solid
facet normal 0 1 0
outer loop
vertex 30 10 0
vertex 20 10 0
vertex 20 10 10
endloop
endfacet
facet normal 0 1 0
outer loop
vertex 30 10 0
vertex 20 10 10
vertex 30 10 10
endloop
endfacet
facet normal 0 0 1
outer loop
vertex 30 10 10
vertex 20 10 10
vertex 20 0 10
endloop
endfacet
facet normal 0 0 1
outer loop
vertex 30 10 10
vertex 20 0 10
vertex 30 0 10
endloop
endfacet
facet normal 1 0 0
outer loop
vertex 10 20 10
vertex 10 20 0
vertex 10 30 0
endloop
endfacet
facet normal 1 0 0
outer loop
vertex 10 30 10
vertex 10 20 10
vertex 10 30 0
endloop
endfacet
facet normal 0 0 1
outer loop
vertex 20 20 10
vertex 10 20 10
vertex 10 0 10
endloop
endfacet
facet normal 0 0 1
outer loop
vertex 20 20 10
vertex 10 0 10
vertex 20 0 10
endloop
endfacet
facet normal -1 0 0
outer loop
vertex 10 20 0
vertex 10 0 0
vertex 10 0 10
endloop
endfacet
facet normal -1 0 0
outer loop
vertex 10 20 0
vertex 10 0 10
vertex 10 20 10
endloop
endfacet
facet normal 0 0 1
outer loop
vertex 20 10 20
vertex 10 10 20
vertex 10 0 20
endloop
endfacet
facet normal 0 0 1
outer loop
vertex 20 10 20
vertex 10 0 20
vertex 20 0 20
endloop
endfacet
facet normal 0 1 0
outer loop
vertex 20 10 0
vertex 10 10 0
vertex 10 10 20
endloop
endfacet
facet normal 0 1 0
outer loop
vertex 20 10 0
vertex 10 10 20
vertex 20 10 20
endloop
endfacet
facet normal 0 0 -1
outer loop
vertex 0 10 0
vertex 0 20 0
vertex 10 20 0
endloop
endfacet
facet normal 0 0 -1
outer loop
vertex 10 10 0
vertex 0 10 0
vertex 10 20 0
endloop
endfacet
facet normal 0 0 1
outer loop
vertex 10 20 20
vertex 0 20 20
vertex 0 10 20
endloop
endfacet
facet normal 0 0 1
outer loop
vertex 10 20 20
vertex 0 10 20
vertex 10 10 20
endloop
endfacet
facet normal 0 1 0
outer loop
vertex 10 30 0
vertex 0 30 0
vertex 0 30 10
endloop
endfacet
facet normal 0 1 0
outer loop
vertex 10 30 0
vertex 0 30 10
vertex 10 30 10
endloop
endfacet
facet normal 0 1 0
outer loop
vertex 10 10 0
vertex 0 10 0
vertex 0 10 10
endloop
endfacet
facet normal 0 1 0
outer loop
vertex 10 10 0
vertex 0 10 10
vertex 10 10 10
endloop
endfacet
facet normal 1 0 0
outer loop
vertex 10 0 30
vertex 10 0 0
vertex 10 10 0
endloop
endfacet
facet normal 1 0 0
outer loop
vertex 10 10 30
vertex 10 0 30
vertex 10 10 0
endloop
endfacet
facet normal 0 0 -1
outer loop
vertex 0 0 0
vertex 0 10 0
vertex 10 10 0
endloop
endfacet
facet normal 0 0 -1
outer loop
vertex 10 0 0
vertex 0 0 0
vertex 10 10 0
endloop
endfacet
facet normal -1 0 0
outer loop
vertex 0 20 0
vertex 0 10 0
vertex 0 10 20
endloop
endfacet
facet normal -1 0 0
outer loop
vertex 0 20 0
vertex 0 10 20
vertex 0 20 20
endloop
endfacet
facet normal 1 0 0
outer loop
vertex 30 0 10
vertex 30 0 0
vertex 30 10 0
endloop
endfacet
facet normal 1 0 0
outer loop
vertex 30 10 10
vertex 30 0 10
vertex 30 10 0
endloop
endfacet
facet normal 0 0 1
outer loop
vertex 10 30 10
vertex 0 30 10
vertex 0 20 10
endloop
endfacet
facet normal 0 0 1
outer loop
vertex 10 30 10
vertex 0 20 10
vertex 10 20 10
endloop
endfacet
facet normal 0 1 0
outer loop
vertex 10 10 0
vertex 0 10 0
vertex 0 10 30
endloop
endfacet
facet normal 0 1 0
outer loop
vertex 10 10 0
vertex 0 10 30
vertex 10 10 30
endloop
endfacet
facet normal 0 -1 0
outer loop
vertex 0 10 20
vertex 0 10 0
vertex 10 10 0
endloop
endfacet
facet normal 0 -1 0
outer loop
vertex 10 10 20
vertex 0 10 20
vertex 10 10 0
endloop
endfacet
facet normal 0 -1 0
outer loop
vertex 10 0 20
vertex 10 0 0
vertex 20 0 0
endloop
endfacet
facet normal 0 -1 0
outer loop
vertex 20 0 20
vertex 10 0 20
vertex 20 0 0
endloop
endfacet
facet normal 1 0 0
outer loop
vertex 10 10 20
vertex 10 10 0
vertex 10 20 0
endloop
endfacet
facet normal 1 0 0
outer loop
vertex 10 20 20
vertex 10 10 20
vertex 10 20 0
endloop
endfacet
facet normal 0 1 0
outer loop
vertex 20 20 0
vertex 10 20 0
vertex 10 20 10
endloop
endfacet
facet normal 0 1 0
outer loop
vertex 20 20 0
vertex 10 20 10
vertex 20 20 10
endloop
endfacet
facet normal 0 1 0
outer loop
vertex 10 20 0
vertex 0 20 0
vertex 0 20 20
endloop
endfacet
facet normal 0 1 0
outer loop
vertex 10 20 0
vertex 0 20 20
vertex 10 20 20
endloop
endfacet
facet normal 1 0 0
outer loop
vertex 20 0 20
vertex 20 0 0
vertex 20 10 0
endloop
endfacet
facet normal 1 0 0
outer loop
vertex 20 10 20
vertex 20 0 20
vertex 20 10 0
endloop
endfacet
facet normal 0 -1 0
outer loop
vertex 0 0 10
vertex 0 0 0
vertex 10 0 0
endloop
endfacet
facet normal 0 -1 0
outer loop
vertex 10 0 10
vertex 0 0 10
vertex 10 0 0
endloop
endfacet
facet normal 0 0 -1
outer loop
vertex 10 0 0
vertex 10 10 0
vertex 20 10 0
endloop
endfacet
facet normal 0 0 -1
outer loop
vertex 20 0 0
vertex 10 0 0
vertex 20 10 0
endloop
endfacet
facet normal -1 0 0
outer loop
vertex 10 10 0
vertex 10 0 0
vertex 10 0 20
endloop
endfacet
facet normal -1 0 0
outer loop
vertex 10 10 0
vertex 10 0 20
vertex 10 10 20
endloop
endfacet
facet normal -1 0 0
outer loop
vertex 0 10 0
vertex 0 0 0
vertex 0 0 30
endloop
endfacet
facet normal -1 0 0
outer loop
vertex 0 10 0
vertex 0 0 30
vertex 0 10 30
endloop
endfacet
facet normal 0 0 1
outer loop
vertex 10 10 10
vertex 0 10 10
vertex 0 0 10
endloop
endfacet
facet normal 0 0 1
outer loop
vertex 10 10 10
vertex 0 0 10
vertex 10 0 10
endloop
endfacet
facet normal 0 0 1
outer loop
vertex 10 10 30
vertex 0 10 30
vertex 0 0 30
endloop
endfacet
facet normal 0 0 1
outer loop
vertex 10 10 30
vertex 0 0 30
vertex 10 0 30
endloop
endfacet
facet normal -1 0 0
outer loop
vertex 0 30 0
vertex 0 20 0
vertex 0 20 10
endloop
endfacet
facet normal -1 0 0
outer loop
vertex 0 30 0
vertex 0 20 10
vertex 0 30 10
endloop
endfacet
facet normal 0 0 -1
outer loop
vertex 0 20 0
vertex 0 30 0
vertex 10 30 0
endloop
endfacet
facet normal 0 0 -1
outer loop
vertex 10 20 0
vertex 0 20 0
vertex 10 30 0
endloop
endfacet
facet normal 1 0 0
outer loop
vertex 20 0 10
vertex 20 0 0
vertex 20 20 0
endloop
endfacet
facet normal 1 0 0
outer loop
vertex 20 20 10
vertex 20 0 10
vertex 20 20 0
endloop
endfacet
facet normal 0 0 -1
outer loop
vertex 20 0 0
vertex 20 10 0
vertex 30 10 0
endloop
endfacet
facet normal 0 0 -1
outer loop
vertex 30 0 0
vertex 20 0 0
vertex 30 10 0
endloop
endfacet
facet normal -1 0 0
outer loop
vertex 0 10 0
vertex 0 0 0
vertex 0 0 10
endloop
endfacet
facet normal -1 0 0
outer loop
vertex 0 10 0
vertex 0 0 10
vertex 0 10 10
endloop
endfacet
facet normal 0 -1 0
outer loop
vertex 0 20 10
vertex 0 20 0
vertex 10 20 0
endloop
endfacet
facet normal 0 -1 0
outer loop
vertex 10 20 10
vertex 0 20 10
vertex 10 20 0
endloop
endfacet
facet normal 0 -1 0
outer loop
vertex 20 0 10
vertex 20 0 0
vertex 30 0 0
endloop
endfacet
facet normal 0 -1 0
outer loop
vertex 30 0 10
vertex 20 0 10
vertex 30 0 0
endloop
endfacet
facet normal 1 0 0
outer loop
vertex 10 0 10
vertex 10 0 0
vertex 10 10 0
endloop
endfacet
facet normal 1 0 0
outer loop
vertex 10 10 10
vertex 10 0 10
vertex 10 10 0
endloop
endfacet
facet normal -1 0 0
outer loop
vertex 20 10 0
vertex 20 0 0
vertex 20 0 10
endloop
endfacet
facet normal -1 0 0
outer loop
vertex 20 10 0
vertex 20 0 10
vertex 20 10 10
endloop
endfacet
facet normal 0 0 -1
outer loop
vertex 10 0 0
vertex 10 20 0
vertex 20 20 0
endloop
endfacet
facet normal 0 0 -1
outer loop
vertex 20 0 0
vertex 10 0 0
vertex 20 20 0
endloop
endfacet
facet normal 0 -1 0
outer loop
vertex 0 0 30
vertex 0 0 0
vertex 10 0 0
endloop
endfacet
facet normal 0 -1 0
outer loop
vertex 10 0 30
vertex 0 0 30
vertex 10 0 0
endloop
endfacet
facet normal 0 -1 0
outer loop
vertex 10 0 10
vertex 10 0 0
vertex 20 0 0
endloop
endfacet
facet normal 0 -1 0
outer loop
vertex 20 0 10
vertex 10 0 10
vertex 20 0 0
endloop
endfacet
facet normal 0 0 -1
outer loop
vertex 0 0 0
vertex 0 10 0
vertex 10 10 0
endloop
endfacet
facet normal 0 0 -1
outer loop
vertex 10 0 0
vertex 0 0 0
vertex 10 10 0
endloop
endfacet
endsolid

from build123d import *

# Parameters (mm, degrees)
BOX_W        = 10
BOX_H        = 10
BOX_DEPTH    = 30
BOX001_W     = 10
BOX001_H     = 10
BOX001_DEPTH = 20
BOX002_W     = 10
BOX002_H     = 20
BOX002_DEPTH = 10
BOX003_W     = 10
BOX003_H     = 10
BOX003_DEPTH = 10
BOX004_W     = 10
BOX004_H     = 10
BOX004_DEPTH = 10
BOX005_W     = 10
BOX005_H     = 10
BOX005_DEPTH = 10
BOX006_W     = 10
BOX006_H     = 10
BOX006_DEPTH = 20


with BuildPart() as cub:
    # Box → Box (new body)
    with BuildSketch(Plane.XY):
        with Locations((5, 5)):
            Rectangle(BOX_W, BOX_H)
    extrude(amount=BOX_DEPTH)


with BuildPart() as cub001:
    # Box001 → Box001 (new body)
    with BuildSketch(Plane(origin=(0, 10, 0), x_dir=(1, 0, 0), z_dir=(0, 0, 1))):
        with Locations((5, 5)):
            Rectangle(BOX001_W, BOX001_H)
    extrude(amount=BOX001_DEPTH)


with BuildPart() as cub002:
    # Box002 → Box002 (new body)
    with BuildSketch(Plane(origin=(10, 0, 0), x_dir=(1, 0, 0), z_dir=(0, 0, 1))):
        with Locations((5, 10)):
            Rectangle(BOX002_W, BOX002_H)
    extrude(amount=BOX002_DEPTH)


with BuildPart() as cub003:
    # Box003 → Box003 (new body)
    with BuildSketch(Plane(origin=(20, 0, 0), x_dir=(1, 0, 0), z_dir=(0, 0, 1))):
        with Locations((5, 5)):
            Rectangle(BOX003_W, BOX003_H)
    extrude(amount=BOX003_DEPTH)


with BuildPart() as cub004:
    # Box004 → Box004 (new body)
    with BuildSketch(Plane(origin=(0, 20, 0), x_dir=(1, 0, 0), z_dir=(0, 0, 1))):
        with Locations((5, 5)):
            Rectangle(BOX004_W, BOX004_H)
    extrude(amount=BOX004_DEPTH)


with BuildPart() as cub005:
    # Box005 → Box005 (new body)
    with BuildSketch(Plane.XY):
        with Locations((5, 5)):
            Rectangle(BOX005_W, BOX005_H)
    extrude(amount=BOX005_DEPTH)


with BuildPart() as cub006:
    # Box006 → Box006 (new body)
    with BuildSketch(Plane(origin=(10, 0, 0), x_dir=(1, 0, 0), z_dir=(0, 0, 1))):
        with Locations((5, 5)):
            Rectangle(BOX006_W, BOX006_H)
    extrude(amount=BOX006_DEPTH)


solid = Compound([cub.part, cub001.part, cub002.part, cub003.part, cub004.part, cub005.part, cub006.part])
